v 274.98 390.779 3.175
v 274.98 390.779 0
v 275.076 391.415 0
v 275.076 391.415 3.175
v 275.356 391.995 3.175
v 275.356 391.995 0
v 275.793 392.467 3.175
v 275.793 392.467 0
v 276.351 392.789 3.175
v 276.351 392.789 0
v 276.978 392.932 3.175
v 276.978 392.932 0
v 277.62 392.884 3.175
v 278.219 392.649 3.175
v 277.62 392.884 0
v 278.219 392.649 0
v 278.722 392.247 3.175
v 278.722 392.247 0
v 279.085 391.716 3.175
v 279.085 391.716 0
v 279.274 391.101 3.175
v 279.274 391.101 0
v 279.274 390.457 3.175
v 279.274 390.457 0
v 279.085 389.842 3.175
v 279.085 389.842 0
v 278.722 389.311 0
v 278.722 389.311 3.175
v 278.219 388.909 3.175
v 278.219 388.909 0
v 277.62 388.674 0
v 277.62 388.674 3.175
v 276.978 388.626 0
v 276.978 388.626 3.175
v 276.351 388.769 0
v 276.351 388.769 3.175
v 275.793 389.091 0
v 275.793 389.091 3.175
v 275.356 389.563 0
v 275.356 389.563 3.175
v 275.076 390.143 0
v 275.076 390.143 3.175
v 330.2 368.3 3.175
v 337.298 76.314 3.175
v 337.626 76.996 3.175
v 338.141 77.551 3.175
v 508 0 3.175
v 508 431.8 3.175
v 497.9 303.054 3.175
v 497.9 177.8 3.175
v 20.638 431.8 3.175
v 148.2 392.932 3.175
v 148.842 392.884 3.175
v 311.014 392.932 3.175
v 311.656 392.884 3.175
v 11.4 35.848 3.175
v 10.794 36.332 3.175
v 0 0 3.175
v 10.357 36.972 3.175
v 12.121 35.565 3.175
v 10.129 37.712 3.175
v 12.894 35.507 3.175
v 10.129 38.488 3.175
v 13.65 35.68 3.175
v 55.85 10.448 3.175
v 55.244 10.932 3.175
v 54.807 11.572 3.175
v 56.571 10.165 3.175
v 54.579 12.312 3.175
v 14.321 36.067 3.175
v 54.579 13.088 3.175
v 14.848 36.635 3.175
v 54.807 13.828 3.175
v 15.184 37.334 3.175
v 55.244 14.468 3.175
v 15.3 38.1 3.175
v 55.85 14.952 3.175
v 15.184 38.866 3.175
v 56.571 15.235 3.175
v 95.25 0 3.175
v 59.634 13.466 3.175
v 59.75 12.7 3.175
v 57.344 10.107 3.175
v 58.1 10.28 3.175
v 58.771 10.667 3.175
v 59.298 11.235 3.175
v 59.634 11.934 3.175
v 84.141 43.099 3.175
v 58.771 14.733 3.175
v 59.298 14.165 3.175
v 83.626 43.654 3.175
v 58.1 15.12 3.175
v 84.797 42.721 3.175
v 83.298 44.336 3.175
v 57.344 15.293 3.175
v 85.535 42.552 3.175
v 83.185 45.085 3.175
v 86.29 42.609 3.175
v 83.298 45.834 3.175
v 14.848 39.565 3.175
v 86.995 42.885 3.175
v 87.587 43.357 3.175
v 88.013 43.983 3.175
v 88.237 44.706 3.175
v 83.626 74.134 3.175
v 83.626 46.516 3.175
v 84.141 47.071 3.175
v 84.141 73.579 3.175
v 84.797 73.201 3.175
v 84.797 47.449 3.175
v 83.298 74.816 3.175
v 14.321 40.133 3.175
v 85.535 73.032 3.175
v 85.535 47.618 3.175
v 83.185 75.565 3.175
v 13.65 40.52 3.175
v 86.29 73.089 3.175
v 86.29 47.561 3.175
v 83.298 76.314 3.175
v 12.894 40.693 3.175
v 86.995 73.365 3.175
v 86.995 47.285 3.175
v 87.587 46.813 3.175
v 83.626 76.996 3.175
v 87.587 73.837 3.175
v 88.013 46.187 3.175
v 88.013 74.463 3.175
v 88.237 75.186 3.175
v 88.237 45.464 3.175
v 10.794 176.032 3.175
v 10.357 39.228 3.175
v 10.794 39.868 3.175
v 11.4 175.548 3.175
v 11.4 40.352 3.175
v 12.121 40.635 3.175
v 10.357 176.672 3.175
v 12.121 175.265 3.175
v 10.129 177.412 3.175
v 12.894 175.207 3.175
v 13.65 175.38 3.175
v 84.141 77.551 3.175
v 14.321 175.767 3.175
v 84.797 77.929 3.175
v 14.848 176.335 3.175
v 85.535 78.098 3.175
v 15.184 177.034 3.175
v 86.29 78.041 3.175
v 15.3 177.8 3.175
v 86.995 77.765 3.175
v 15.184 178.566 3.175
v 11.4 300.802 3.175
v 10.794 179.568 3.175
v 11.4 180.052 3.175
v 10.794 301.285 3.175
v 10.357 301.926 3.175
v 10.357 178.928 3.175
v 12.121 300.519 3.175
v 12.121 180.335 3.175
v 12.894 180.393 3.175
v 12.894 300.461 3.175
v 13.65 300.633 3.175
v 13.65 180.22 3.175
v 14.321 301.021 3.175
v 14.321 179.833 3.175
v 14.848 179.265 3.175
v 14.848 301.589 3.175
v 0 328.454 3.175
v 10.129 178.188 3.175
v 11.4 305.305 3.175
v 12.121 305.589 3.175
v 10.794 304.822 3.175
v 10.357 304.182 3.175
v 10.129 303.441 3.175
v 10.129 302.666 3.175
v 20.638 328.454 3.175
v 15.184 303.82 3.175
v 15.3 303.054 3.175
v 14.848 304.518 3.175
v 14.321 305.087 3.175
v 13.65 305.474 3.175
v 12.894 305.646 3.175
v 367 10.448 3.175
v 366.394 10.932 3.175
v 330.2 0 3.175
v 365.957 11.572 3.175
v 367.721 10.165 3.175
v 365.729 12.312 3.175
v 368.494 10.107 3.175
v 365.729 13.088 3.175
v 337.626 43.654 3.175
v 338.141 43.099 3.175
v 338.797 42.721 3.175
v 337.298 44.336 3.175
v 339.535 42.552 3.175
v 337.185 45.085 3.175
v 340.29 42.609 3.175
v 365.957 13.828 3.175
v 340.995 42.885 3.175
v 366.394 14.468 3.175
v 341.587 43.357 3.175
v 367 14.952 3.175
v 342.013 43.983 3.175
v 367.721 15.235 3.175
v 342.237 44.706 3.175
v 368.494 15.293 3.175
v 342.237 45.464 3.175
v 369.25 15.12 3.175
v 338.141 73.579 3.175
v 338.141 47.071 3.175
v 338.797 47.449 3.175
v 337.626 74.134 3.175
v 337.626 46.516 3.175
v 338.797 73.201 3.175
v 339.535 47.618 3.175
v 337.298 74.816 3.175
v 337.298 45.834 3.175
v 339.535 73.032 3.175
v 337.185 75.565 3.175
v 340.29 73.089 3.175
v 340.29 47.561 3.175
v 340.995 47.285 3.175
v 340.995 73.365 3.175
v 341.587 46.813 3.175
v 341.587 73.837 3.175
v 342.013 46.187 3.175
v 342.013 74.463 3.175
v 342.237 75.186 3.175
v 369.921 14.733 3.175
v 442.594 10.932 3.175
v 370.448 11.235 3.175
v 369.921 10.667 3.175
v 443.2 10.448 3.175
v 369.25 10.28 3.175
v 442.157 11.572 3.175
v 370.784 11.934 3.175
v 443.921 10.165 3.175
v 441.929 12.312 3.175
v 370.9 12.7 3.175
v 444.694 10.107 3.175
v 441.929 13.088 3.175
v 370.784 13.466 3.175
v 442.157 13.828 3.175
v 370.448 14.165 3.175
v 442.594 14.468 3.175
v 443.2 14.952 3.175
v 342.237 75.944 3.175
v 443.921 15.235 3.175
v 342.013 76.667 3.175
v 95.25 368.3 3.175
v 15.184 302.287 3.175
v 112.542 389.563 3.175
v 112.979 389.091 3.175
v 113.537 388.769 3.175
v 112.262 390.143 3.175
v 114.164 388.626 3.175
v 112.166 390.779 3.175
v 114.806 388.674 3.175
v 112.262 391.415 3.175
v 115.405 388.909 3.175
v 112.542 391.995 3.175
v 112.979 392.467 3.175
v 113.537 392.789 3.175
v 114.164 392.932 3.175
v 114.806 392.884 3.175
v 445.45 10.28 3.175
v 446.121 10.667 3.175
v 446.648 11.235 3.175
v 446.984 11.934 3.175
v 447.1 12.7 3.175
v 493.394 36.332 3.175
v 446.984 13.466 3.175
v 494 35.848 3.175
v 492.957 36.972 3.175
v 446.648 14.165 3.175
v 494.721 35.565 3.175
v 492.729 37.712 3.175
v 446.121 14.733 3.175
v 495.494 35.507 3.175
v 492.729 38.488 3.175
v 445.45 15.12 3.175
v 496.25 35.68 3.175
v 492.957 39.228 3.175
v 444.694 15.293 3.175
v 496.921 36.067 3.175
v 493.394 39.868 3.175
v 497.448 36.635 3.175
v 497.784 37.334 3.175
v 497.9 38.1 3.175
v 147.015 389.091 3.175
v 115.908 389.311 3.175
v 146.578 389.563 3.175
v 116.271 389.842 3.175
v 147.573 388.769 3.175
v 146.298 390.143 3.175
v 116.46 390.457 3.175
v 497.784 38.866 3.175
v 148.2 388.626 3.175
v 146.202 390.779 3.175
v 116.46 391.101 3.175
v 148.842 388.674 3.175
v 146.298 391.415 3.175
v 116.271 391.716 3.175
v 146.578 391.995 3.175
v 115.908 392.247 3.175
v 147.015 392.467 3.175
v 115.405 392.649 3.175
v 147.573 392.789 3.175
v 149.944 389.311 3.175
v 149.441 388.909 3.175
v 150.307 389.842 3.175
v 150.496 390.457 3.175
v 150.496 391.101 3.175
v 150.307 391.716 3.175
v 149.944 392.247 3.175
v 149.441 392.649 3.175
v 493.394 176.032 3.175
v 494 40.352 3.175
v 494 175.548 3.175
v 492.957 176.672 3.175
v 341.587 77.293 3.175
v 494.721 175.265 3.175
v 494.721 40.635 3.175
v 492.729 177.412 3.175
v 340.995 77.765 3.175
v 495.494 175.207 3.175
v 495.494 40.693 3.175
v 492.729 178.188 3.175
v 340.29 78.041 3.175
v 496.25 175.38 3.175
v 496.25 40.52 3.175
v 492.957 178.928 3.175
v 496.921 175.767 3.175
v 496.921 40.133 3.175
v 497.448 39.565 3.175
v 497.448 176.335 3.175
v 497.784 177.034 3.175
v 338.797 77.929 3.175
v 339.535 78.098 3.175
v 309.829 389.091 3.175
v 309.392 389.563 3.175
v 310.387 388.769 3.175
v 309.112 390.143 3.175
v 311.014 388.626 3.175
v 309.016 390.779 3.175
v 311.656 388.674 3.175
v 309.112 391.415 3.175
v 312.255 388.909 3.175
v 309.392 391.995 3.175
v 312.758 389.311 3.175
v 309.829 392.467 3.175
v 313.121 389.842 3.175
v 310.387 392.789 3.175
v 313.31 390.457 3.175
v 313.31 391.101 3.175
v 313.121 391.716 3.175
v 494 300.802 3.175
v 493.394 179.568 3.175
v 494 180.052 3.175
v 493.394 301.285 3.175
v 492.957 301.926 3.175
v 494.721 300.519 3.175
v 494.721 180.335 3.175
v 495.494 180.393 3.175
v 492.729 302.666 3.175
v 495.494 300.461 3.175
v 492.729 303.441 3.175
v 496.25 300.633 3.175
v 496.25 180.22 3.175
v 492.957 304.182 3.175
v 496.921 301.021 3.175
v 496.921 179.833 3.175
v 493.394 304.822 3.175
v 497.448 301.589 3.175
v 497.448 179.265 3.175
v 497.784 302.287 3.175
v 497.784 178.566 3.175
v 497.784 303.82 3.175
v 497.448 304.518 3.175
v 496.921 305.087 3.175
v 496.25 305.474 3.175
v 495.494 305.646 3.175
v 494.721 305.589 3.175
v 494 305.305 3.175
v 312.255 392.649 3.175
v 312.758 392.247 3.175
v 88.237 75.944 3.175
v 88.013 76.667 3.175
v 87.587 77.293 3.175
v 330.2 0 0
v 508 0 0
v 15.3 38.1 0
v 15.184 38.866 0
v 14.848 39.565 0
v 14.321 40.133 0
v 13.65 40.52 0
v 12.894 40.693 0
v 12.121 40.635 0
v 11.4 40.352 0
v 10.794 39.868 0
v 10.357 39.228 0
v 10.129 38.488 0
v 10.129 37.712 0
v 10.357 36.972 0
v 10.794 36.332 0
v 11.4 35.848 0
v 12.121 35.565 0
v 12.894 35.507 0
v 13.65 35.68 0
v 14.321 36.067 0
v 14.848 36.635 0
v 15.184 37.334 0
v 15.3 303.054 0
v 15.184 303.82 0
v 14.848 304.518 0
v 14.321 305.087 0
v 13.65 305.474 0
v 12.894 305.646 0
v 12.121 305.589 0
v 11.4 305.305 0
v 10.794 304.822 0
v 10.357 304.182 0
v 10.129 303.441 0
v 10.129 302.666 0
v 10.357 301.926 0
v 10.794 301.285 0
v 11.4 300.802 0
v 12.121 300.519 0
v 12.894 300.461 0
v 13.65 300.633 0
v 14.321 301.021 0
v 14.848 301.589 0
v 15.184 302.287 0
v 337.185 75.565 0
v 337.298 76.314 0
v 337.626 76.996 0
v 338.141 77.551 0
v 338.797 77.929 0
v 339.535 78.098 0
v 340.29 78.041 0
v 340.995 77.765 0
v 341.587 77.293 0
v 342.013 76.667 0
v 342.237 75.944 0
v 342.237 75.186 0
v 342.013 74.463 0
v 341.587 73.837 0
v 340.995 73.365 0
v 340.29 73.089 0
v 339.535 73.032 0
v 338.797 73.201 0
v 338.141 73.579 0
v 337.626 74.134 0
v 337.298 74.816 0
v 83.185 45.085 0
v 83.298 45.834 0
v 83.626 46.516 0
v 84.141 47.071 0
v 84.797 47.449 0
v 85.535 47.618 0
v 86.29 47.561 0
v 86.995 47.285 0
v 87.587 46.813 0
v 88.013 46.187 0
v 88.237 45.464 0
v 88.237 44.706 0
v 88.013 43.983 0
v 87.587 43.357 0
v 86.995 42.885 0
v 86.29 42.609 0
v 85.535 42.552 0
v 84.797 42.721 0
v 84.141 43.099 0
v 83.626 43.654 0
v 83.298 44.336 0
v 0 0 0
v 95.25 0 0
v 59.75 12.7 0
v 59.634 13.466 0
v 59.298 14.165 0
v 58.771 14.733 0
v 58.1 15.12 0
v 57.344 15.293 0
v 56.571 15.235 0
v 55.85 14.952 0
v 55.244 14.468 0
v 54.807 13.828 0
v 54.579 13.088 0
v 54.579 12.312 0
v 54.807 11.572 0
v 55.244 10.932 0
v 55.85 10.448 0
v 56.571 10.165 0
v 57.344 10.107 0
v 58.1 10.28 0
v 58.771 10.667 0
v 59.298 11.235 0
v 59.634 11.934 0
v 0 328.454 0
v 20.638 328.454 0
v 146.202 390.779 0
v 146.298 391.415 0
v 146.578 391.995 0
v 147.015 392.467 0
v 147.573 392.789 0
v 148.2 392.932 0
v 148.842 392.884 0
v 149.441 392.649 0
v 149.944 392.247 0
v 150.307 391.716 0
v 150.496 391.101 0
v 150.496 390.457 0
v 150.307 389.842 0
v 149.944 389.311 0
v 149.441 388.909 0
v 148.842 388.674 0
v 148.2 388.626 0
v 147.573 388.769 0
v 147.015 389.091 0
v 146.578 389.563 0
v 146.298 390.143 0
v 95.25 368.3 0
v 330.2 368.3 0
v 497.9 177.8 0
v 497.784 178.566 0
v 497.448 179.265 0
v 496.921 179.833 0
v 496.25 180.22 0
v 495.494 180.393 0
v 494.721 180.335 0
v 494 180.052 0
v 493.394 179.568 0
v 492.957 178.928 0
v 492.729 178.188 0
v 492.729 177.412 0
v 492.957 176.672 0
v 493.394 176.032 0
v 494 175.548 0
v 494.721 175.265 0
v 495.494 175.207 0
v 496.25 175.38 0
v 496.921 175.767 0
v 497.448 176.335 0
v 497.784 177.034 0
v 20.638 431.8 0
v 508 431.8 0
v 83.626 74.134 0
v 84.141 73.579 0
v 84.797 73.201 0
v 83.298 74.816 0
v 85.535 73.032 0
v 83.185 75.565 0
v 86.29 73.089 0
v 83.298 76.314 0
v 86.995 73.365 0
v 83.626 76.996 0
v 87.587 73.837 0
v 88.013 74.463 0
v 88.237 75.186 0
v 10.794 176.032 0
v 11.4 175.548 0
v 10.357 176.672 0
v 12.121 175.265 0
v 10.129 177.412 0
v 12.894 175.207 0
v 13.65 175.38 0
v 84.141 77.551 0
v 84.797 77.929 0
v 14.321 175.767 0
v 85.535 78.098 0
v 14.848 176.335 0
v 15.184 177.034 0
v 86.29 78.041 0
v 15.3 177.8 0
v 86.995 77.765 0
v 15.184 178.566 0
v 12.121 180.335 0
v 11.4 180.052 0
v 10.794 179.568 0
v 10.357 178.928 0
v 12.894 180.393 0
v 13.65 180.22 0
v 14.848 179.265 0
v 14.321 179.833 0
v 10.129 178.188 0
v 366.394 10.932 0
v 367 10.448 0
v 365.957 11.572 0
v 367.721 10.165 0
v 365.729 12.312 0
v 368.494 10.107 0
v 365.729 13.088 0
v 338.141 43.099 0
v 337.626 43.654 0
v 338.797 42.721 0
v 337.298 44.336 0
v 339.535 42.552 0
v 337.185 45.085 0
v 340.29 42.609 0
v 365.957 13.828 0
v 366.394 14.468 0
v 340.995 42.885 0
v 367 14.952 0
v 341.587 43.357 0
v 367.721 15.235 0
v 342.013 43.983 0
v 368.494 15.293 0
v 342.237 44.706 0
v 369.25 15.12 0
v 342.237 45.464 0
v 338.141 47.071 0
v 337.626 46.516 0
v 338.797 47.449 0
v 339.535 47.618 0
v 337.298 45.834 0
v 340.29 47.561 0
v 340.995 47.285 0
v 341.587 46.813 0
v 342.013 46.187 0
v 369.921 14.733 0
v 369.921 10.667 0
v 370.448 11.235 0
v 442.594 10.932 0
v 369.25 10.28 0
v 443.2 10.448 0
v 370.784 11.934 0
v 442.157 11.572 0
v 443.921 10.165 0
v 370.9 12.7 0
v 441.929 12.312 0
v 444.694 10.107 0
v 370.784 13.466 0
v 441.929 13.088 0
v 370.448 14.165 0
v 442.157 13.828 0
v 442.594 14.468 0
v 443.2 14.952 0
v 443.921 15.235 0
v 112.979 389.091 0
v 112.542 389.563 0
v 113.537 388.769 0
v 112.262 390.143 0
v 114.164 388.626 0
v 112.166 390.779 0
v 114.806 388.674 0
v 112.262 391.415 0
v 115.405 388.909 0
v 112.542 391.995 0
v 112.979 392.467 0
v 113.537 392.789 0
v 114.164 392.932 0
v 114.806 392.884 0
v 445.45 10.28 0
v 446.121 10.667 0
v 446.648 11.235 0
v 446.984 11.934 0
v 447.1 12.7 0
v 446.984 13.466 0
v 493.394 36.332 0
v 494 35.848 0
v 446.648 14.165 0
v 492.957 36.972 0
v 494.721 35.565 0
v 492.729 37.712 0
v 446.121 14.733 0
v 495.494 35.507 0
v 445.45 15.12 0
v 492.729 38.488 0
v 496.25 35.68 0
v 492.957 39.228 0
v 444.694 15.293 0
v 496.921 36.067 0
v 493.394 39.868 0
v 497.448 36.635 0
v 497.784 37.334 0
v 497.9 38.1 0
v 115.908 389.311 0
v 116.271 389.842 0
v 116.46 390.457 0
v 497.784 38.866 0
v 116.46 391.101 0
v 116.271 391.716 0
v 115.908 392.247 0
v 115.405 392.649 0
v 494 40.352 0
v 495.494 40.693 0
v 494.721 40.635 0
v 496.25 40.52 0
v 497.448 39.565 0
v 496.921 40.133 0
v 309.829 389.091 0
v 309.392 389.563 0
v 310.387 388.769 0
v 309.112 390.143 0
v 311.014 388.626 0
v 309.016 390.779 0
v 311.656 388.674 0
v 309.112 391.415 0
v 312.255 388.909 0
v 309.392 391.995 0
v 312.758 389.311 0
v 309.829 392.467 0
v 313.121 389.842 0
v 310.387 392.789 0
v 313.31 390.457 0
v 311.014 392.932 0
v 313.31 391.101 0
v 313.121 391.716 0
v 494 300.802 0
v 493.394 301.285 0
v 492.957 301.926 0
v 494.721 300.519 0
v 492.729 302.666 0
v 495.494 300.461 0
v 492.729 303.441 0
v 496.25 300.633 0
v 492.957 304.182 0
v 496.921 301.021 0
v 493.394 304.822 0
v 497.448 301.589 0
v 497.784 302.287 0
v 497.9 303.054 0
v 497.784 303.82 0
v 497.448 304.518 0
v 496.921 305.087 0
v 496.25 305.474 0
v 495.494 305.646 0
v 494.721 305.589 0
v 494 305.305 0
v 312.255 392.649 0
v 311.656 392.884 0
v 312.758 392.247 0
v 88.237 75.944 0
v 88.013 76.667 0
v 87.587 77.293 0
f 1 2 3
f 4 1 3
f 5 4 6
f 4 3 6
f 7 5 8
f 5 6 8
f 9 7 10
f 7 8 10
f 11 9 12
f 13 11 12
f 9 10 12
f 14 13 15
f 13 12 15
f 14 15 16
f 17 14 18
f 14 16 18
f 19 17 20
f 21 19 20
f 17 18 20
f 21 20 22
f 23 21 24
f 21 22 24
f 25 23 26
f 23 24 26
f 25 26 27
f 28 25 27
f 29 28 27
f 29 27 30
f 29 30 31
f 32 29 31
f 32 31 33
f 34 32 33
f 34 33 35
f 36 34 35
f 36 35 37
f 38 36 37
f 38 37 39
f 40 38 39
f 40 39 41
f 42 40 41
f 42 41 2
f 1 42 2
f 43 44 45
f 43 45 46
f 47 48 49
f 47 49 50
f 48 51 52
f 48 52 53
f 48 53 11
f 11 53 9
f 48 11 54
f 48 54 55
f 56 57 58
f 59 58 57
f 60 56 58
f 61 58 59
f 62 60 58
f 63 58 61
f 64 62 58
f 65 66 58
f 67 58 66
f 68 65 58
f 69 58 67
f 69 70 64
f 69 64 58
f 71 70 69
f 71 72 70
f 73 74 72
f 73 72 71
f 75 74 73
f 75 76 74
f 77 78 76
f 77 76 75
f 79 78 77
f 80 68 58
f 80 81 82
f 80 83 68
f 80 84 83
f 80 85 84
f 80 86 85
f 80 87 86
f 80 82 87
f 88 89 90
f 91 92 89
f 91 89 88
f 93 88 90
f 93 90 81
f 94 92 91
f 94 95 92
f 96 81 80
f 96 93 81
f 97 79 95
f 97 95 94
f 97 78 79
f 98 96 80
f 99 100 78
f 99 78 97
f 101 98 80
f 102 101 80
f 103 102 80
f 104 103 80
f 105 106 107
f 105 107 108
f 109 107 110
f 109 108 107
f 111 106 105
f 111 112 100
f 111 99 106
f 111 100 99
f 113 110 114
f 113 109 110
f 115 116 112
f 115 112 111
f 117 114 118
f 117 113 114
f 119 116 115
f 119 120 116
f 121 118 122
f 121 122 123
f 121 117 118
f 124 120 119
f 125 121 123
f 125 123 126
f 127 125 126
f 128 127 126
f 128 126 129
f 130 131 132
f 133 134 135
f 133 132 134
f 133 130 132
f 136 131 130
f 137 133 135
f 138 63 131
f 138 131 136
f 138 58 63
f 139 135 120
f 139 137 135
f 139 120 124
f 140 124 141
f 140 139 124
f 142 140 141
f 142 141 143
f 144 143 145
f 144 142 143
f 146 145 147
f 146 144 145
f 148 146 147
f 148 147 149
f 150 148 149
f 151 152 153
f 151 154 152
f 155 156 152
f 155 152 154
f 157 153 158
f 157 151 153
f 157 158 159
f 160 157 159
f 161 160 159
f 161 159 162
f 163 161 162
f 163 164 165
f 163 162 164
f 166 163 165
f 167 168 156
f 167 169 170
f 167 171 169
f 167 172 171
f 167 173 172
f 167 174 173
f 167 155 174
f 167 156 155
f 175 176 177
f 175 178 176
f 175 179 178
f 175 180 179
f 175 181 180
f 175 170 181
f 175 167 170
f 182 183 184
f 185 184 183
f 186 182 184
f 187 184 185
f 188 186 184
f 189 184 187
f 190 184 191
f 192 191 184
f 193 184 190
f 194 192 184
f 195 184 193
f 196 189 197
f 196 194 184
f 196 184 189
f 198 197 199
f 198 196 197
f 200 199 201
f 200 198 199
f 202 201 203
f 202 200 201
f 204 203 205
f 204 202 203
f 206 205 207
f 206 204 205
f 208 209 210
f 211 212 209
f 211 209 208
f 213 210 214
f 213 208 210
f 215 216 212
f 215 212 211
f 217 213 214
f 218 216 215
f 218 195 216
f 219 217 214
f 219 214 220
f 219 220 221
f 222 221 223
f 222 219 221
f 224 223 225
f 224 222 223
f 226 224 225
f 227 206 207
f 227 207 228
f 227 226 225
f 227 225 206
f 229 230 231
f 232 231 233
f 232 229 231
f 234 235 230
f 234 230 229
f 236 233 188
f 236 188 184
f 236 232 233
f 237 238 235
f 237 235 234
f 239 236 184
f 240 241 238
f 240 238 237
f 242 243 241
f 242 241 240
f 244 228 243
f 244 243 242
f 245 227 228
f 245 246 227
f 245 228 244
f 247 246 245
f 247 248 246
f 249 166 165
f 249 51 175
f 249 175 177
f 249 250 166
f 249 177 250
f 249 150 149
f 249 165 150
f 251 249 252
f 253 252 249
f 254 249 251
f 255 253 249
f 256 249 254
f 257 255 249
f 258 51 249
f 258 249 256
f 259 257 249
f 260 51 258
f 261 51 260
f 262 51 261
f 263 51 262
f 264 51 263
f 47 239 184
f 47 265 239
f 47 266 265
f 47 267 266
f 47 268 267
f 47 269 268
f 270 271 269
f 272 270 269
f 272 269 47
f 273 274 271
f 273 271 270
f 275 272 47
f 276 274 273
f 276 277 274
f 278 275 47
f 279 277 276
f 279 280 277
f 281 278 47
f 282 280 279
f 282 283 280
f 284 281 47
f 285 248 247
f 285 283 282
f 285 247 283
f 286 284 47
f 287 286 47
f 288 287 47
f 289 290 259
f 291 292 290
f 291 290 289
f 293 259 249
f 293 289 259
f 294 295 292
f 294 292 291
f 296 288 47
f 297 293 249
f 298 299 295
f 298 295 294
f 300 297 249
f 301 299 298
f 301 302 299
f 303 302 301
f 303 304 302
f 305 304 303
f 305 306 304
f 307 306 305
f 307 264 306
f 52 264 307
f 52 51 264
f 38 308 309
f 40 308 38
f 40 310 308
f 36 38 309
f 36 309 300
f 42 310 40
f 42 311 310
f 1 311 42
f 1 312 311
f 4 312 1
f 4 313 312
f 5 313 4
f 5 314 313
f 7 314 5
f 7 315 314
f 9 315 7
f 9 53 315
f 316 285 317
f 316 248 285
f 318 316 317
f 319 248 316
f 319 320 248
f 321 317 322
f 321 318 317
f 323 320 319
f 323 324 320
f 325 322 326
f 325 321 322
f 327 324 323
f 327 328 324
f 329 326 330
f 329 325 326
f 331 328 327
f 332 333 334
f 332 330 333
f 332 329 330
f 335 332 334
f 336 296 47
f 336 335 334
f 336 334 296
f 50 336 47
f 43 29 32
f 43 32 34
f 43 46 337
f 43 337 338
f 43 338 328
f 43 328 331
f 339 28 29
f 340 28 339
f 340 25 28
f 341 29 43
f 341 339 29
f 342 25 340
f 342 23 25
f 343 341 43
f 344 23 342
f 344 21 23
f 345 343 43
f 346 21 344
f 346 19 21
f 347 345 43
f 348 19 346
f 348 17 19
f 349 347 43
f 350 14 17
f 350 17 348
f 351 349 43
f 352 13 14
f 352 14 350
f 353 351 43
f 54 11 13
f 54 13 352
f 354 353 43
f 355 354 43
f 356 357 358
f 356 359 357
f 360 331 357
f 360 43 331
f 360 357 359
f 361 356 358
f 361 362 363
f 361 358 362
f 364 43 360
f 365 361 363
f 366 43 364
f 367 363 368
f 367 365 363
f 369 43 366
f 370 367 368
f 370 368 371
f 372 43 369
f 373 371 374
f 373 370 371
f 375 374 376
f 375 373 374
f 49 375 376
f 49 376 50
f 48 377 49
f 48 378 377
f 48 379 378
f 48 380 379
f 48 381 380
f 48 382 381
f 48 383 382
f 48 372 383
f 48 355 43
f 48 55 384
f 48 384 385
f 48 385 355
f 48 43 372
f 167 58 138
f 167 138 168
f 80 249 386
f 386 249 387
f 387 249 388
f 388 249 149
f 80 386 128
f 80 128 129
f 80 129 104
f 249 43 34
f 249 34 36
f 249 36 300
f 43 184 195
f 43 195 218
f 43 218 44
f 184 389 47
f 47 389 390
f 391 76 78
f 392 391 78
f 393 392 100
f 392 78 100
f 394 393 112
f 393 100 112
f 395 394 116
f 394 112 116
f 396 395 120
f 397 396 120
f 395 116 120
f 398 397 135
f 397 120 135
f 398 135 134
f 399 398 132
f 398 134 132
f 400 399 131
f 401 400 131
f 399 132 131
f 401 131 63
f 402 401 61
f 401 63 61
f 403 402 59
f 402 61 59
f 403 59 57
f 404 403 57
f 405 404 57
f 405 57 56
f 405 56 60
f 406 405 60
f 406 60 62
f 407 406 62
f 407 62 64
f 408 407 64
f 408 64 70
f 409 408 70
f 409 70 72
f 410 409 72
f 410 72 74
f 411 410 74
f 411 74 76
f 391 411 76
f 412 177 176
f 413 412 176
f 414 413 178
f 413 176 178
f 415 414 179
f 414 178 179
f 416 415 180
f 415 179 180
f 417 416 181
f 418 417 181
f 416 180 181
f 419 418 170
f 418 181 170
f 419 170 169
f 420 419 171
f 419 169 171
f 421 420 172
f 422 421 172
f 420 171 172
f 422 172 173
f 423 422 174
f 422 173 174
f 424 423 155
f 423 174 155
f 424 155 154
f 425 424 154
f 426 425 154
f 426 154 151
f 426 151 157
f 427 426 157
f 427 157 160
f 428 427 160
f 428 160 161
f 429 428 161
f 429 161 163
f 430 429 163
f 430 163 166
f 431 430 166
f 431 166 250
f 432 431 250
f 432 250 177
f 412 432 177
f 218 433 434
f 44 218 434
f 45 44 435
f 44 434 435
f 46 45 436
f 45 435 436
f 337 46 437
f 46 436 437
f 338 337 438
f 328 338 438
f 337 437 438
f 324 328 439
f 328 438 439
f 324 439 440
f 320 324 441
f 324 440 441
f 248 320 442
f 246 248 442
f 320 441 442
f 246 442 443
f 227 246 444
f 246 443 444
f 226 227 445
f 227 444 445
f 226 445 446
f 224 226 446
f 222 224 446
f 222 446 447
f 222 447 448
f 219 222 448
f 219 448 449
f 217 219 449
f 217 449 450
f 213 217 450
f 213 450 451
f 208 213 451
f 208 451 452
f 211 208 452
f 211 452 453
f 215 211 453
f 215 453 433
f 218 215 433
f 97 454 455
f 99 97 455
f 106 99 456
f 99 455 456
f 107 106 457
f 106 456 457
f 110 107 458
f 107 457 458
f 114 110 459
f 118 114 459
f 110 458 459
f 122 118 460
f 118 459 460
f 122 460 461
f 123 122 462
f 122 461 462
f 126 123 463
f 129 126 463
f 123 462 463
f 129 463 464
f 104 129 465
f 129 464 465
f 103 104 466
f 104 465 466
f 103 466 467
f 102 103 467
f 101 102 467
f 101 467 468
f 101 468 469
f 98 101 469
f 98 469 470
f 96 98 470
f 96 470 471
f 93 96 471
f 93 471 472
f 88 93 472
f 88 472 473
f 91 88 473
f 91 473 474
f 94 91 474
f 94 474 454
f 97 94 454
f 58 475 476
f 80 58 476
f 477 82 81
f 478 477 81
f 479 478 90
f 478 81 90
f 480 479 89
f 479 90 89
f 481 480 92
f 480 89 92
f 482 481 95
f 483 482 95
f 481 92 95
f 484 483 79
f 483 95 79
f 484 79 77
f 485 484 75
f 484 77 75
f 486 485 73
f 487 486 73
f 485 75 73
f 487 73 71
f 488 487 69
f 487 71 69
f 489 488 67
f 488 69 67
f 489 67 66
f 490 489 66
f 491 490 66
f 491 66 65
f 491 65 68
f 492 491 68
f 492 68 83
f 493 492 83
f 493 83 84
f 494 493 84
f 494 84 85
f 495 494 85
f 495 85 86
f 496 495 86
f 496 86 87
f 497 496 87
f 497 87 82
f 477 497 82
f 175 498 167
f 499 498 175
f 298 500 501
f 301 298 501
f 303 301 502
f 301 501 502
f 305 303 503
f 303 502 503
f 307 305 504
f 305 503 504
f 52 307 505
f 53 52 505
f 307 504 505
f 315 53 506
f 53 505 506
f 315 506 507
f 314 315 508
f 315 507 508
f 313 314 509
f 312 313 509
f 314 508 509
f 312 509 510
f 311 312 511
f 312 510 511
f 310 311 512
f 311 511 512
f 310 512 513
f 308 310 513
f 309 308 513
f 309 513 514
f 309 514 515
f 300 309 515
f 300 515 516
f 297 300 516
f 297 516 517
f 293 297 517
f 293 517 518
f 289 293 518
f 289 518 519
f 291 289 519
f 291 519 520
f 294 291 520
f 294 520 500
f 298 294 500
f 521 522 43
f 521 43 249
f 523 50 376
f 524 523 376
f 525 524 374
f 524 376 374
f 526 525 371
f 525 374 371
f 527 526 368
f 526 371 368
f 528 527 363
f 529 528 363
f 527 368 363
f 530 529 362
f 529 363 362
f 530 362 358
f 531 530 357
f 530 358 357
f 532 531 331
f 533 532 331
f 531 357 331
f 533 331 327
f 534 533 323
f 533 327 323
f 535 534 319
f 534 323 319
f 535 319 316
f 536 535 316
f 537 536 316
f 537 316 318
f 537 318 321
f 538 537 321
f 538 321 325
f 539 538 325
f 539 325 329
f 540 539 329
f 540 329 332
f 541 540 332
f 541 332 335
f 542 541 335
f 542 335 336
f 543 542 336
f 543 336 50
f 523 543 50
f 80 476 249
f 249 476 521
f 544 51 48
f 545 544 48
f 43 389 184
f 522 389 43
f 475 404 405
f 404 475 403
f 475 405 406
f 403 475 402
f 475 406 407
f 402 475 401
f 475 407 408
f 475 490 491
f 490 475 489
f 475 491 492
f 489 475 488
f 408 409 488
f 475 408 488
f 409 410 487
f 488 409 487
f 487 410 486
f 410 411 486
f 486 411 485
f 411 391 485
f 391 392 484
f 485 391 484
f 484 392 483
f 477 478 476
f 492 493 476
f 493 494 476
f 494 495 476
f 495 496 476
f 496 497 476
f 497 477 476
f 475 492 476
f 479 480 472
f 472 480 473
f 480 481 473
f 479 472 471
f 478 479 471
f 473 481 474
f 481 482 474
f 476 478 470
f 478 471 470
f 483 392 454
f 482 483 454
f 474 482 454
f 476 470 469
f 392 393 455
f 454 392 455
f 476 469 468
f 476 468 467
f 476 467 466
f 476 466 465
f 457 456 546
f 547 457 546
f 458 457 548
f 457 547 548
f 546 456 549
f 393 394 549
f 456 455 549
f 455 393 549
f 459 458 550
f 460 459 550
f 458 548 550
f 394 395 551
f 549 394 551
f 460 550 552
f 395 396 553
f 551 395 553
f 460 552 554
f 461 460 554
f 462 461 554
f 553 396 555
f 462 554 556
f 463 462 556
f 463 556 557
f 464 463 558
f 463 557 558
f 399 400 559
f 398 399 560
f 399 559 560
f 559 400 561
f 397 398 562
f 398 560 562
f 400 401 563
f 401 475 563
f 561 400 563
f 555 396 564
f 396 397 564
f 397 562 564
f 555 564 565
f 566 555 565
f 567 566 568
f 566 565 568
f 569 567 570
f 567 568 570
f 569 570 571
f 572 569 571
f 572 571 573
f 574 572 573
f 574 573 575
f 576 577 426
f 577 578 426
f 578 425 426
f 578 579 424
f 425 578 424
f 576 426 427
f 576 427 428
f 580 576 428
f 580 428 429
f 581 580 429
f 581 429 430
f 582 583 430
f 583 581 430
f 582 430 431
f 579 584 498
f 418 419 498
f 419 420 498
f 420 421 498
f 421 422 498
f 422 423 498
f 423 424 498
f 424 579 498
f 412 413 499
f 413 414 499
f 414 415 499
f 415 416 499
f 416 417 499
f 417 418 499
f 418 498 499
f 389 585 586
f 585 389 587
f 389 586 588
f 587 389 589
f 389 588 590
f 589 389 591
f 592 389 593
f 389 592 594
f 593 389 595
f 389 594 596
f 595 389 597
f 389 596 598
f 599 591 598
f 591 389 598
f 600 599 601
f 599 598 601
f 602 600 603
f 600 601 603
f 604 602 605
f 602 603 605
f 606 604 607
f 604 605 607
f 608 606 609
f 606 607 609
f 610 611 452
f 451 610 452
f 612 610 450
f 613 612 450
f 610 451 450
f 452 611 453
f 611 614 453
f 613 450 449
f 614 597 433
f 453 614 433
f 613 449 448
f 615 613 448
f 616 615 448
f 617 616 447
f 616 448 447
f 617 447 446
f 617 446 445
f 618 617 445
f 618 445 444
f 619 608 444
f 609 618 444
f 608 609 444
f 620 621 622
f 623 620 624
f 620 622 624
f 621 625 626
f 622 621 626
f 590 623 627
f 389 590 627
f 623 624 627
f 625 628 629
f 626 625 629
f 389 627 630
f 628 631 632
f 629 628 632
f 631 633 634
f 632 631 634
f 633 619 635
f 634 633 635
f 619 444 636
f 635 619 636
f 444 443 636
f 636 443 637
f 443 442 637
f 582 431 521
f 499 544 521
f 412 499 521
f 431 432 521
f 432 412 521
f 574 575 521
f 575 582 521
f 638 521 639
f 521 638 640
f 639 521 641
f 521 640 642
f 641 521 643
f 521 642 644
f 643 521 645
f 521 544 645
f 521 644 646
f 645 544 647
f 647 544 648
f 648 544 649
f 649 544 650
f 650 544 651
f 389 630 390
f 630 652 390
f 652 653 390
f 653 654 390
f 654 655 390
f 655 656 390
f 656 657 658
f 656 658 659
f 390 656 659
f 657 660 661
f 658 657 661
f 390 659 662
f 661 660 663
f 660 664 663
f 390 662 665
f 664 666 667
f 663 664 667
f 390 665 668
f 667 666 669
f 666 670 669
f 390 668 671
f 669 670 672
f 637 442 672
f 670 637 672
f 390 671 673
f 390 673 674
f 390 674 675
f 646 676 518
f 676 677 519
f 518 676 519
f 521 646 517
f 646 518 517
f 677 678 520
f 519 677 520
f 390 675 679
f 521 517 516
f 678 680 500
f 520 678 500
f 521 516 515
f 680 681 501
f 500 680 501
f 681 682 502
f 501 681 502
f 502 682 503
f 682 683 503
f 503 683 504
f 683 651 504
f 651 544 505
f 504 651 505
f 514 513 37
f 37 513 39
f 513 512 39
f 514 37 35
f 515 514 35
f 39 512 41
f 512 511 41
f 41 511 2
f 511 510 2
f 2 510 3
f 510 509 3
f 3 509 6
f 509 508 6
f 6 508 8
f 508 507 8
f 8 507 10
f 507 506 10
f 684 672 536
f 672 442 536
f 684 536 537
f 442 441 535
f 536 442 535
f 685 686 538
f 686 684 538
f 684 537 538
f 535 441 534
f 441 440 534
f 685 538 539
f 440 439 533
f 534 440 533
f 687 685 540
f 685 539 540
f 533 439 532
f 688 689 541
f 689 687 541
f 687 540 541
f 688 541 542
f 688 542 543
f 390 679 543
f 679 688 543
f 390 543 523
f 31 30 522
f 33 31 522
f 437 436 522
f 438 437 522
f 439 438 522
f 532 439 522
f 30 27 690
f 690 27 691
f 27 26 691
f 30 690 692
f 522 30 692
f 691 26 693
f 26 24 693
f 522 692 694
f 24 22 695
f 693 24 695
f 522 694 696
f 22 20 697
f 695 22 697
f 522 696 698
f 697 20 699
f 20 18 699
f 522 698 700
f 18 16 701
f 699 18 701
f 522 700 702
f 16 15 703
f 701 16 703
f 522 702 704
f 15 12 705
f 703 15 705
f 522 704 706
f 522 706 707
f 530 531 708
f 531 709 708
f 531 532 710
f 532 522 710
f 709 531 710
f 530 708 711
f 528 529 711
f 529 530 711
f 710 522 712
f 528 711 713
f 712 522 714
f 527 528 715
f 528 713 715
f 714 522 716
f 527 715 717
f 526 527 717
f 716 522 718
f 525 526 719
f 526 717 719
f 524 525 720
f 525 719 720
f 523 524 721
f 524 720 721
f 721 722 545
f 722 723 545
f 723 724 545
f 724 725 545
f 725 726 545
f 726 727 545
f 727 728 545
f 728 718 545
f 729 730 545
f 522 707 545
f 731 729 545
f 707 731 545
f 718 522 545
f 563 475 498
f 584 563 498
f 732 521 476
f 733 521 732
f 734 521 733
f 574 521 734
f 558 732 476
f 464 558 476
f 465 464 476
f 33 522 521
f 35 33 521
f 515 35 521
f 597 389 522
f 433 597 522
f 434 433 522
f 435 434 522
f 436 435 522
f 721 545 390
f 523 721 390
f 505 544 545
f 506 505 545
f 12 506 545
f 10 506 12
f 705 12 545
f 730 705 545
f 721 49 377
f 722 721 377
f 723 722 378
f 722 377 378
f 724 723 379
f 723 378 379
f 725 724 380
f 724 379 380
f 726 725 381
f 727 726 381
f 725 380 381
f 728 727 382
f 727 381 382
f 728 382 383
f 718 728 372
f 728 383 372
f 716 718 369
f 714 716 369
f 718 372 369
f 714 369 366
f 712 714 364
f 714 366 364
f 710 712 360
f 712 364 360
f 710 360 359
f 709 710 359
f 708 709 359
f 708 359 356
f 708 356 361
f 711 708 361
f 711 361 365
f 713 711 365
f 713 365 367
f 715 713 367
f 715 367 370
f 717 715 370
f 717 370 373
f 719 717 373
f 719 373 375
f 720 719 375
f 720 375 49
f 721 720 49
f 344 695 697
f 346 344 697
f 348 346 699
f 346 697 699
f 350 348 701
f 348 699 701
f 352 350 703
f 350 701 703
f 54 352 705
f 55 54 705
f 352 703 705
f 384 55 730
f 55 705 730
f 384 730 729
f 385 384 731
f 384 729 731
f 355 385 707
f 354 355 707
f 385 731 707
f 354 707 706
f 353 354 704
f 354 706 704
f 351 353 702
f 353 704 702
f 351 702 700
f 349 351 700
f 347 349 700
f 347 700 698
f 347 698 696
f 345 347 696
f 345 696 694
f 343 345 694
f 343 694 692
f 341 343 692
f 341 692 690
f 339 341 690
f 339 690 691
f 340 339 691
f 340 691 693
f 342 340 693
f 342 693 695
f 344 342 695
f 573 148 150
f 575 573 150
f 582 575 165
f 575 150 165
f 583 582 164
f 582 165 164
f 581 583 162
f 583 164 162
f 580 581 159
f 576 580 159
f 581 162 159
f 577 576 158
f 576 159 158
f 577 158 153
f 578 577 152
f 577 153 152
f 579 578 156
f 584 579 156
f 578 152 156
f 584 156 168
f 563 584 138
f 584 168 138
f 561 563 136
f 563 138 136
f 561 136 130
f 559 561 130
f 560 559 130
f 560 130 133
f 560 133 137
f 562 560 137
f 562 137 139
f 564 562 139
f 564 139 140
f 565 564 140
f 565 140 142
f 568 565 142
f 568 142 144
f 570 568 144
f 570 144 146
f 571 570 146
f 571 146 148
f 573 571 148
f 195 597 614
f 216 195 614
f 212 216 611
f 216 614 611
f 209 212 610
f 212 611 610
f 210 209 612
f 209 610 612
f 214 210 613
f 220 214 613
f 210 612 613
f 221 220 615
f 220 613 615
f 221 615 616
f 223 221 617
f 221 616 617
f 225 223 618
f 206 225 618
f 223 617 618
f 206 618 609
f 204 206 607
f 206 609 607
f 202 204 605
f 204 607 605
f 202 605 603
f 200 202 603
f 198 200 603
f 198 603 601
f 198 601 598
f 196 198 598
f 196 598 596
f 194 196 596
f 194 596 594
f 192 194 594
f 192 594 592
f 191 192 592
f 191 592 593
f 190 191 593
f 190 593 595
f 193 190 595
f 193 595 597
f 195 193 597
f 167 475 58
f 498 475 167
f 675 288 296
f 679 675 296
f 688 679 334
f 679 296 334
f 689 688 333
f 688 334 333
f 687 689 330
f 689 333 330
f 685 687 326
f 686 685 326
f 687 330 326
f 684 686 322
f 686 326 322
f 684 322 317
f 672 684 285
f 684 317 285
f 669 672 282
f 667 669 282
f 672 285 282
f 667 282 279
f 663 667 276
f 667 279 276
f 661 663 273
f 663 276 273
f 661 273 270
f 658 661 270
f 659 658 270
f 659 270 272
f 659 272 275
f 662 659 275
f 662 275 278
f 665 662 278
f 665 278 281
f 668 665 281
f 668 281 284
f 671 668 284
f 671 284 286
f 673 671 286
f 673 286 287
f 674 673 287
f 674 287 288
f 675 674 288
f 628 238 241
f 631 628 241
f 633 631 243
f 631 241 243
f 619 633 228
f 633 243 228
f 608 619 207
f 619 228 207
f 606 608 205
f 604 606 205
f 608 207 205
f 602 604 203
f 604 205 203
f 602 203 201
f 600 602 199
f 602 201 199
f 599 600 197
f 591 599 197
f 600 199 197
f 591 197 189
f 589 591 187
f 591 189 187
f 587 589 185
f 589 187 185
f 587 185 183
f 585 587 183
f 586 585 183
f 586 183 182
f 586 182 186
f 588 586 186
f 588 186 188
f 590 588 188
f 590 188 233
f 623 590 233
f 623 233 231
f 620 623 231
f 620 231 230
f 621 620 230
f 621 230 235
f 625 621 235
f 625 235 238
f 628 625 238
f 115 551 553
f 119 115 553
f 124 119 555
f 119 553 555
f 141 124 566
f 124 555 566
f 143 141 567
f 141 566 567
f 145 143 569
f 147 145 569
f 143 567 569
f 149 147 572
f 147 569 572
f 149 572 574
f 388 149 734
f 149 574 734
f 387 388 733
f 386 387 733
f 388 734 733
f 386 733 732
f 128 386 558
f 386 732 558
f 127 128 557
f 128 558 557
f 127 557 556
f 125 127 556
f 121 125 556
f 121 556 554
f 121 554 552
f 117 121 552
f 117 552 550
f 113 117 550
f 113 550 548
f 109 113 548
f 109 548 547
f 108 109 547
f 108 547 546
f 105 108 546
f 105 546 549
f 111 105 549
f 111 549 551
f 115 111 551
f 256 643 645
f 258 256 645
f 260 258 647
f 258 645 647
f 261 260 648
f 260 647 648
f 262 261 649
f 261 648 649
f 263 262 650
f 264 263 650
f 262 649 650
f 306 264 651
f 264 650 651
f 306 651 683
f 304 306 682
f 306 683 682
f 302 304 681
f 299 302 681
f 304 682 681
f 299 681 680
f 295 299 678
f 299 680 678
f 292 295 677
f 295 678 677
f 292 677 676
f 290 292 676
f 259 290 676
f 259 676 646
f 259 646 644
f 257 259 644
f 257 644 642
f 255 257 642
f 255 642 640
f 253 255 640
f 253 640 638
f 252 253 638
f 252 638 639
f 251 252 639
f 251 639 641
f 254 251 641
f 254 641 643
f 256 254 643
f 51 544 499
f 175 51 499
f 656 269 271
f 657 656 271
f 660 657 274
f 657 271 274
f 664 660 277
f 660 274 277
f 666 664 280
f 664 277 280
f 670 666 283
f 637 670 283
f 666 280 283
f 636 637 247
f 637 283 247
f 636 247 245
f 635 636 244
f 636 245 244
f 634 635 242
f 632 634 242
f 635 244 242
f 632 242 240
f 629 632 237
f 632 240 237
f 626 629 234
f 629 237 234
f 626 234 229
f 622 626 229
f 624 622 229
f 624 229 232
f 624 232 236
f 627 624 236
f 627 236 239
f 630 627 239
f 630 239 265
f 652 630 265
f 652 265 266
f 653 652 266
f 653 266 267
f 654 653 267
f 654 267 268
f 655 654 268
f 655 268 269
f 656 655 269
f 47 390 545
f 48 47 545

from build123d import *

# Parameters (mm, degrees)
SKETCH1_W           = 508
SKETCH1_H           = 508
BOSS_EXTRUDE1_DEPTH = 3.175
SKETCH2_R           = 2.54
SKETCH2_W           = 234.95
SKETCH2_H           = 368.3
CUT_EXTRUDE1_DEPTH  = 44.45
SKETCH4_R           = 2.159
CUT_EXTRUDE3_DEPTH  = 719.427505476
SKETCH5_R           = 2.6
CUT_EXTRUDE4_DEPTH  = 719.427505476
SKETCH6_W           = 487.3625
SKETCH6_H           = 76.2
CUT_EXTRUDE5_DEPTH  = 719.427505476


with BuildPart() as part:
    # Sketch1 → Boss-Extrude1 (new body)
    with BuildSketch(Plane.XY):
        with Locations((254, 254)):
            Rectangle(SKETCH1_W, SKETCH1_H)
    extrude(amount=BOSS_EXTRUDE1_DEPTH)

    # Sketch2 → Cut-Extrude1 (cut)
    with BuildSketch(Plane(origin=(0, 0, 0), x_dir=(-1, 0, 0), z_dir=(0, 0, -1))):
        with Locations((-339.725, 45.085)):
            Circle(SKETCH2_R)
        with Locations((-85.725, 45.085)):
            Circle(SKETCH2_R)
        with Locations((-339.725, 75.565)):
            Circle(SKETCH2_R)
        with Locations((-85.725, 75.565)):
            Circle(SKETCH2_R)
        with Locations((-212.725, 184.15)):
            Rectangle(SKETCH2_W, SKETCH2_H)
        Polygon((0, 403.06625), (0, 328.45375), (-20.6375, 328.45375), (-20.6375, 403.06625), (-20.6375, 508), (0, 508), align=None)
    extrude(amount=-CUT_EXTRUDE1_DEPTH, mode=Mode.SUBTRACT)

    # Sketch4 → Cut-Extrude3 (cut, through all)
    with BuildSketch(Plane(origin=(0, 0, 0), x_dir=(-1, 0, 0), z_dir=(0, 0, -1))):
        with Locations((-311.1754, 390.779)):
            Circle(SKETCH4_R)
        with Locations((-277.1394, 390.779)):
            Circle(SKETCH4_R)
        with Locations((-148.3614, 390.779)):
            Circle(SKETCH4_R)
        with Locations((-114.3254, 390.779)):
            Circle(SKETCH4_R)
    extrude(amount=-CUT_EXTRUDE3_DEPTH, mode=Mode.SUBTRACT)

    # Sketch5 → Cut-Extrude4 (cut, through all)
    with BuildSketch(Plane.XY.offset(3.175)):
        with Locations((12.7, 303.05375)):
            Circle(SKETCH5_R)
        with Locations((12.7, 177.8)):
            Circle(SKETCH5_R)
        with Locations((12.7, 38.1)):
            Circle(SKETCH5_R)
        with Locations((495.3, 38.1)):
            Circle(SKETCH5_R)
        with Locations((495.3, 177.8)):
            Circle(SKETCH5_R)
        with Locations((495.3, 303.05375)):
            Circle(SKETCH5_R)
        with Locations((495.3, 469.9)):
            Circle(SKETCH5_R)
        with Locations((57.15, 12.7)):
            Circle(SKETCH5_R)
        with Locations((368.3, 12.7)):
            Circle(SKETCH5_R)
        with Locations((444.5, 12.7)):
            Circle(SKETCH5_R)
        with Locations((33.3375, 495.3)):
            Circle(SKETCH5_R)
        with Locations((469.9, 495.3)):
            Circle(SKETCH5_R)
    extrude(amount=-CUT_EXTRUDE4_DEPTH, mode=Mode.SUBTRACT)

    # Sketch6 → Cut-Extrude5 (cut, through all)
    with BuildSketch(Plane.XY.offset(3.175)):
        with Locations((264.31875, 469.9)):
            Rectangle(SKETCH6_W, SKETCH6_H)
    extrude(amount=-CUT_EXTRUDE5_DEPTH, mode=Mode.SUBTRACT)


solid = part.part
